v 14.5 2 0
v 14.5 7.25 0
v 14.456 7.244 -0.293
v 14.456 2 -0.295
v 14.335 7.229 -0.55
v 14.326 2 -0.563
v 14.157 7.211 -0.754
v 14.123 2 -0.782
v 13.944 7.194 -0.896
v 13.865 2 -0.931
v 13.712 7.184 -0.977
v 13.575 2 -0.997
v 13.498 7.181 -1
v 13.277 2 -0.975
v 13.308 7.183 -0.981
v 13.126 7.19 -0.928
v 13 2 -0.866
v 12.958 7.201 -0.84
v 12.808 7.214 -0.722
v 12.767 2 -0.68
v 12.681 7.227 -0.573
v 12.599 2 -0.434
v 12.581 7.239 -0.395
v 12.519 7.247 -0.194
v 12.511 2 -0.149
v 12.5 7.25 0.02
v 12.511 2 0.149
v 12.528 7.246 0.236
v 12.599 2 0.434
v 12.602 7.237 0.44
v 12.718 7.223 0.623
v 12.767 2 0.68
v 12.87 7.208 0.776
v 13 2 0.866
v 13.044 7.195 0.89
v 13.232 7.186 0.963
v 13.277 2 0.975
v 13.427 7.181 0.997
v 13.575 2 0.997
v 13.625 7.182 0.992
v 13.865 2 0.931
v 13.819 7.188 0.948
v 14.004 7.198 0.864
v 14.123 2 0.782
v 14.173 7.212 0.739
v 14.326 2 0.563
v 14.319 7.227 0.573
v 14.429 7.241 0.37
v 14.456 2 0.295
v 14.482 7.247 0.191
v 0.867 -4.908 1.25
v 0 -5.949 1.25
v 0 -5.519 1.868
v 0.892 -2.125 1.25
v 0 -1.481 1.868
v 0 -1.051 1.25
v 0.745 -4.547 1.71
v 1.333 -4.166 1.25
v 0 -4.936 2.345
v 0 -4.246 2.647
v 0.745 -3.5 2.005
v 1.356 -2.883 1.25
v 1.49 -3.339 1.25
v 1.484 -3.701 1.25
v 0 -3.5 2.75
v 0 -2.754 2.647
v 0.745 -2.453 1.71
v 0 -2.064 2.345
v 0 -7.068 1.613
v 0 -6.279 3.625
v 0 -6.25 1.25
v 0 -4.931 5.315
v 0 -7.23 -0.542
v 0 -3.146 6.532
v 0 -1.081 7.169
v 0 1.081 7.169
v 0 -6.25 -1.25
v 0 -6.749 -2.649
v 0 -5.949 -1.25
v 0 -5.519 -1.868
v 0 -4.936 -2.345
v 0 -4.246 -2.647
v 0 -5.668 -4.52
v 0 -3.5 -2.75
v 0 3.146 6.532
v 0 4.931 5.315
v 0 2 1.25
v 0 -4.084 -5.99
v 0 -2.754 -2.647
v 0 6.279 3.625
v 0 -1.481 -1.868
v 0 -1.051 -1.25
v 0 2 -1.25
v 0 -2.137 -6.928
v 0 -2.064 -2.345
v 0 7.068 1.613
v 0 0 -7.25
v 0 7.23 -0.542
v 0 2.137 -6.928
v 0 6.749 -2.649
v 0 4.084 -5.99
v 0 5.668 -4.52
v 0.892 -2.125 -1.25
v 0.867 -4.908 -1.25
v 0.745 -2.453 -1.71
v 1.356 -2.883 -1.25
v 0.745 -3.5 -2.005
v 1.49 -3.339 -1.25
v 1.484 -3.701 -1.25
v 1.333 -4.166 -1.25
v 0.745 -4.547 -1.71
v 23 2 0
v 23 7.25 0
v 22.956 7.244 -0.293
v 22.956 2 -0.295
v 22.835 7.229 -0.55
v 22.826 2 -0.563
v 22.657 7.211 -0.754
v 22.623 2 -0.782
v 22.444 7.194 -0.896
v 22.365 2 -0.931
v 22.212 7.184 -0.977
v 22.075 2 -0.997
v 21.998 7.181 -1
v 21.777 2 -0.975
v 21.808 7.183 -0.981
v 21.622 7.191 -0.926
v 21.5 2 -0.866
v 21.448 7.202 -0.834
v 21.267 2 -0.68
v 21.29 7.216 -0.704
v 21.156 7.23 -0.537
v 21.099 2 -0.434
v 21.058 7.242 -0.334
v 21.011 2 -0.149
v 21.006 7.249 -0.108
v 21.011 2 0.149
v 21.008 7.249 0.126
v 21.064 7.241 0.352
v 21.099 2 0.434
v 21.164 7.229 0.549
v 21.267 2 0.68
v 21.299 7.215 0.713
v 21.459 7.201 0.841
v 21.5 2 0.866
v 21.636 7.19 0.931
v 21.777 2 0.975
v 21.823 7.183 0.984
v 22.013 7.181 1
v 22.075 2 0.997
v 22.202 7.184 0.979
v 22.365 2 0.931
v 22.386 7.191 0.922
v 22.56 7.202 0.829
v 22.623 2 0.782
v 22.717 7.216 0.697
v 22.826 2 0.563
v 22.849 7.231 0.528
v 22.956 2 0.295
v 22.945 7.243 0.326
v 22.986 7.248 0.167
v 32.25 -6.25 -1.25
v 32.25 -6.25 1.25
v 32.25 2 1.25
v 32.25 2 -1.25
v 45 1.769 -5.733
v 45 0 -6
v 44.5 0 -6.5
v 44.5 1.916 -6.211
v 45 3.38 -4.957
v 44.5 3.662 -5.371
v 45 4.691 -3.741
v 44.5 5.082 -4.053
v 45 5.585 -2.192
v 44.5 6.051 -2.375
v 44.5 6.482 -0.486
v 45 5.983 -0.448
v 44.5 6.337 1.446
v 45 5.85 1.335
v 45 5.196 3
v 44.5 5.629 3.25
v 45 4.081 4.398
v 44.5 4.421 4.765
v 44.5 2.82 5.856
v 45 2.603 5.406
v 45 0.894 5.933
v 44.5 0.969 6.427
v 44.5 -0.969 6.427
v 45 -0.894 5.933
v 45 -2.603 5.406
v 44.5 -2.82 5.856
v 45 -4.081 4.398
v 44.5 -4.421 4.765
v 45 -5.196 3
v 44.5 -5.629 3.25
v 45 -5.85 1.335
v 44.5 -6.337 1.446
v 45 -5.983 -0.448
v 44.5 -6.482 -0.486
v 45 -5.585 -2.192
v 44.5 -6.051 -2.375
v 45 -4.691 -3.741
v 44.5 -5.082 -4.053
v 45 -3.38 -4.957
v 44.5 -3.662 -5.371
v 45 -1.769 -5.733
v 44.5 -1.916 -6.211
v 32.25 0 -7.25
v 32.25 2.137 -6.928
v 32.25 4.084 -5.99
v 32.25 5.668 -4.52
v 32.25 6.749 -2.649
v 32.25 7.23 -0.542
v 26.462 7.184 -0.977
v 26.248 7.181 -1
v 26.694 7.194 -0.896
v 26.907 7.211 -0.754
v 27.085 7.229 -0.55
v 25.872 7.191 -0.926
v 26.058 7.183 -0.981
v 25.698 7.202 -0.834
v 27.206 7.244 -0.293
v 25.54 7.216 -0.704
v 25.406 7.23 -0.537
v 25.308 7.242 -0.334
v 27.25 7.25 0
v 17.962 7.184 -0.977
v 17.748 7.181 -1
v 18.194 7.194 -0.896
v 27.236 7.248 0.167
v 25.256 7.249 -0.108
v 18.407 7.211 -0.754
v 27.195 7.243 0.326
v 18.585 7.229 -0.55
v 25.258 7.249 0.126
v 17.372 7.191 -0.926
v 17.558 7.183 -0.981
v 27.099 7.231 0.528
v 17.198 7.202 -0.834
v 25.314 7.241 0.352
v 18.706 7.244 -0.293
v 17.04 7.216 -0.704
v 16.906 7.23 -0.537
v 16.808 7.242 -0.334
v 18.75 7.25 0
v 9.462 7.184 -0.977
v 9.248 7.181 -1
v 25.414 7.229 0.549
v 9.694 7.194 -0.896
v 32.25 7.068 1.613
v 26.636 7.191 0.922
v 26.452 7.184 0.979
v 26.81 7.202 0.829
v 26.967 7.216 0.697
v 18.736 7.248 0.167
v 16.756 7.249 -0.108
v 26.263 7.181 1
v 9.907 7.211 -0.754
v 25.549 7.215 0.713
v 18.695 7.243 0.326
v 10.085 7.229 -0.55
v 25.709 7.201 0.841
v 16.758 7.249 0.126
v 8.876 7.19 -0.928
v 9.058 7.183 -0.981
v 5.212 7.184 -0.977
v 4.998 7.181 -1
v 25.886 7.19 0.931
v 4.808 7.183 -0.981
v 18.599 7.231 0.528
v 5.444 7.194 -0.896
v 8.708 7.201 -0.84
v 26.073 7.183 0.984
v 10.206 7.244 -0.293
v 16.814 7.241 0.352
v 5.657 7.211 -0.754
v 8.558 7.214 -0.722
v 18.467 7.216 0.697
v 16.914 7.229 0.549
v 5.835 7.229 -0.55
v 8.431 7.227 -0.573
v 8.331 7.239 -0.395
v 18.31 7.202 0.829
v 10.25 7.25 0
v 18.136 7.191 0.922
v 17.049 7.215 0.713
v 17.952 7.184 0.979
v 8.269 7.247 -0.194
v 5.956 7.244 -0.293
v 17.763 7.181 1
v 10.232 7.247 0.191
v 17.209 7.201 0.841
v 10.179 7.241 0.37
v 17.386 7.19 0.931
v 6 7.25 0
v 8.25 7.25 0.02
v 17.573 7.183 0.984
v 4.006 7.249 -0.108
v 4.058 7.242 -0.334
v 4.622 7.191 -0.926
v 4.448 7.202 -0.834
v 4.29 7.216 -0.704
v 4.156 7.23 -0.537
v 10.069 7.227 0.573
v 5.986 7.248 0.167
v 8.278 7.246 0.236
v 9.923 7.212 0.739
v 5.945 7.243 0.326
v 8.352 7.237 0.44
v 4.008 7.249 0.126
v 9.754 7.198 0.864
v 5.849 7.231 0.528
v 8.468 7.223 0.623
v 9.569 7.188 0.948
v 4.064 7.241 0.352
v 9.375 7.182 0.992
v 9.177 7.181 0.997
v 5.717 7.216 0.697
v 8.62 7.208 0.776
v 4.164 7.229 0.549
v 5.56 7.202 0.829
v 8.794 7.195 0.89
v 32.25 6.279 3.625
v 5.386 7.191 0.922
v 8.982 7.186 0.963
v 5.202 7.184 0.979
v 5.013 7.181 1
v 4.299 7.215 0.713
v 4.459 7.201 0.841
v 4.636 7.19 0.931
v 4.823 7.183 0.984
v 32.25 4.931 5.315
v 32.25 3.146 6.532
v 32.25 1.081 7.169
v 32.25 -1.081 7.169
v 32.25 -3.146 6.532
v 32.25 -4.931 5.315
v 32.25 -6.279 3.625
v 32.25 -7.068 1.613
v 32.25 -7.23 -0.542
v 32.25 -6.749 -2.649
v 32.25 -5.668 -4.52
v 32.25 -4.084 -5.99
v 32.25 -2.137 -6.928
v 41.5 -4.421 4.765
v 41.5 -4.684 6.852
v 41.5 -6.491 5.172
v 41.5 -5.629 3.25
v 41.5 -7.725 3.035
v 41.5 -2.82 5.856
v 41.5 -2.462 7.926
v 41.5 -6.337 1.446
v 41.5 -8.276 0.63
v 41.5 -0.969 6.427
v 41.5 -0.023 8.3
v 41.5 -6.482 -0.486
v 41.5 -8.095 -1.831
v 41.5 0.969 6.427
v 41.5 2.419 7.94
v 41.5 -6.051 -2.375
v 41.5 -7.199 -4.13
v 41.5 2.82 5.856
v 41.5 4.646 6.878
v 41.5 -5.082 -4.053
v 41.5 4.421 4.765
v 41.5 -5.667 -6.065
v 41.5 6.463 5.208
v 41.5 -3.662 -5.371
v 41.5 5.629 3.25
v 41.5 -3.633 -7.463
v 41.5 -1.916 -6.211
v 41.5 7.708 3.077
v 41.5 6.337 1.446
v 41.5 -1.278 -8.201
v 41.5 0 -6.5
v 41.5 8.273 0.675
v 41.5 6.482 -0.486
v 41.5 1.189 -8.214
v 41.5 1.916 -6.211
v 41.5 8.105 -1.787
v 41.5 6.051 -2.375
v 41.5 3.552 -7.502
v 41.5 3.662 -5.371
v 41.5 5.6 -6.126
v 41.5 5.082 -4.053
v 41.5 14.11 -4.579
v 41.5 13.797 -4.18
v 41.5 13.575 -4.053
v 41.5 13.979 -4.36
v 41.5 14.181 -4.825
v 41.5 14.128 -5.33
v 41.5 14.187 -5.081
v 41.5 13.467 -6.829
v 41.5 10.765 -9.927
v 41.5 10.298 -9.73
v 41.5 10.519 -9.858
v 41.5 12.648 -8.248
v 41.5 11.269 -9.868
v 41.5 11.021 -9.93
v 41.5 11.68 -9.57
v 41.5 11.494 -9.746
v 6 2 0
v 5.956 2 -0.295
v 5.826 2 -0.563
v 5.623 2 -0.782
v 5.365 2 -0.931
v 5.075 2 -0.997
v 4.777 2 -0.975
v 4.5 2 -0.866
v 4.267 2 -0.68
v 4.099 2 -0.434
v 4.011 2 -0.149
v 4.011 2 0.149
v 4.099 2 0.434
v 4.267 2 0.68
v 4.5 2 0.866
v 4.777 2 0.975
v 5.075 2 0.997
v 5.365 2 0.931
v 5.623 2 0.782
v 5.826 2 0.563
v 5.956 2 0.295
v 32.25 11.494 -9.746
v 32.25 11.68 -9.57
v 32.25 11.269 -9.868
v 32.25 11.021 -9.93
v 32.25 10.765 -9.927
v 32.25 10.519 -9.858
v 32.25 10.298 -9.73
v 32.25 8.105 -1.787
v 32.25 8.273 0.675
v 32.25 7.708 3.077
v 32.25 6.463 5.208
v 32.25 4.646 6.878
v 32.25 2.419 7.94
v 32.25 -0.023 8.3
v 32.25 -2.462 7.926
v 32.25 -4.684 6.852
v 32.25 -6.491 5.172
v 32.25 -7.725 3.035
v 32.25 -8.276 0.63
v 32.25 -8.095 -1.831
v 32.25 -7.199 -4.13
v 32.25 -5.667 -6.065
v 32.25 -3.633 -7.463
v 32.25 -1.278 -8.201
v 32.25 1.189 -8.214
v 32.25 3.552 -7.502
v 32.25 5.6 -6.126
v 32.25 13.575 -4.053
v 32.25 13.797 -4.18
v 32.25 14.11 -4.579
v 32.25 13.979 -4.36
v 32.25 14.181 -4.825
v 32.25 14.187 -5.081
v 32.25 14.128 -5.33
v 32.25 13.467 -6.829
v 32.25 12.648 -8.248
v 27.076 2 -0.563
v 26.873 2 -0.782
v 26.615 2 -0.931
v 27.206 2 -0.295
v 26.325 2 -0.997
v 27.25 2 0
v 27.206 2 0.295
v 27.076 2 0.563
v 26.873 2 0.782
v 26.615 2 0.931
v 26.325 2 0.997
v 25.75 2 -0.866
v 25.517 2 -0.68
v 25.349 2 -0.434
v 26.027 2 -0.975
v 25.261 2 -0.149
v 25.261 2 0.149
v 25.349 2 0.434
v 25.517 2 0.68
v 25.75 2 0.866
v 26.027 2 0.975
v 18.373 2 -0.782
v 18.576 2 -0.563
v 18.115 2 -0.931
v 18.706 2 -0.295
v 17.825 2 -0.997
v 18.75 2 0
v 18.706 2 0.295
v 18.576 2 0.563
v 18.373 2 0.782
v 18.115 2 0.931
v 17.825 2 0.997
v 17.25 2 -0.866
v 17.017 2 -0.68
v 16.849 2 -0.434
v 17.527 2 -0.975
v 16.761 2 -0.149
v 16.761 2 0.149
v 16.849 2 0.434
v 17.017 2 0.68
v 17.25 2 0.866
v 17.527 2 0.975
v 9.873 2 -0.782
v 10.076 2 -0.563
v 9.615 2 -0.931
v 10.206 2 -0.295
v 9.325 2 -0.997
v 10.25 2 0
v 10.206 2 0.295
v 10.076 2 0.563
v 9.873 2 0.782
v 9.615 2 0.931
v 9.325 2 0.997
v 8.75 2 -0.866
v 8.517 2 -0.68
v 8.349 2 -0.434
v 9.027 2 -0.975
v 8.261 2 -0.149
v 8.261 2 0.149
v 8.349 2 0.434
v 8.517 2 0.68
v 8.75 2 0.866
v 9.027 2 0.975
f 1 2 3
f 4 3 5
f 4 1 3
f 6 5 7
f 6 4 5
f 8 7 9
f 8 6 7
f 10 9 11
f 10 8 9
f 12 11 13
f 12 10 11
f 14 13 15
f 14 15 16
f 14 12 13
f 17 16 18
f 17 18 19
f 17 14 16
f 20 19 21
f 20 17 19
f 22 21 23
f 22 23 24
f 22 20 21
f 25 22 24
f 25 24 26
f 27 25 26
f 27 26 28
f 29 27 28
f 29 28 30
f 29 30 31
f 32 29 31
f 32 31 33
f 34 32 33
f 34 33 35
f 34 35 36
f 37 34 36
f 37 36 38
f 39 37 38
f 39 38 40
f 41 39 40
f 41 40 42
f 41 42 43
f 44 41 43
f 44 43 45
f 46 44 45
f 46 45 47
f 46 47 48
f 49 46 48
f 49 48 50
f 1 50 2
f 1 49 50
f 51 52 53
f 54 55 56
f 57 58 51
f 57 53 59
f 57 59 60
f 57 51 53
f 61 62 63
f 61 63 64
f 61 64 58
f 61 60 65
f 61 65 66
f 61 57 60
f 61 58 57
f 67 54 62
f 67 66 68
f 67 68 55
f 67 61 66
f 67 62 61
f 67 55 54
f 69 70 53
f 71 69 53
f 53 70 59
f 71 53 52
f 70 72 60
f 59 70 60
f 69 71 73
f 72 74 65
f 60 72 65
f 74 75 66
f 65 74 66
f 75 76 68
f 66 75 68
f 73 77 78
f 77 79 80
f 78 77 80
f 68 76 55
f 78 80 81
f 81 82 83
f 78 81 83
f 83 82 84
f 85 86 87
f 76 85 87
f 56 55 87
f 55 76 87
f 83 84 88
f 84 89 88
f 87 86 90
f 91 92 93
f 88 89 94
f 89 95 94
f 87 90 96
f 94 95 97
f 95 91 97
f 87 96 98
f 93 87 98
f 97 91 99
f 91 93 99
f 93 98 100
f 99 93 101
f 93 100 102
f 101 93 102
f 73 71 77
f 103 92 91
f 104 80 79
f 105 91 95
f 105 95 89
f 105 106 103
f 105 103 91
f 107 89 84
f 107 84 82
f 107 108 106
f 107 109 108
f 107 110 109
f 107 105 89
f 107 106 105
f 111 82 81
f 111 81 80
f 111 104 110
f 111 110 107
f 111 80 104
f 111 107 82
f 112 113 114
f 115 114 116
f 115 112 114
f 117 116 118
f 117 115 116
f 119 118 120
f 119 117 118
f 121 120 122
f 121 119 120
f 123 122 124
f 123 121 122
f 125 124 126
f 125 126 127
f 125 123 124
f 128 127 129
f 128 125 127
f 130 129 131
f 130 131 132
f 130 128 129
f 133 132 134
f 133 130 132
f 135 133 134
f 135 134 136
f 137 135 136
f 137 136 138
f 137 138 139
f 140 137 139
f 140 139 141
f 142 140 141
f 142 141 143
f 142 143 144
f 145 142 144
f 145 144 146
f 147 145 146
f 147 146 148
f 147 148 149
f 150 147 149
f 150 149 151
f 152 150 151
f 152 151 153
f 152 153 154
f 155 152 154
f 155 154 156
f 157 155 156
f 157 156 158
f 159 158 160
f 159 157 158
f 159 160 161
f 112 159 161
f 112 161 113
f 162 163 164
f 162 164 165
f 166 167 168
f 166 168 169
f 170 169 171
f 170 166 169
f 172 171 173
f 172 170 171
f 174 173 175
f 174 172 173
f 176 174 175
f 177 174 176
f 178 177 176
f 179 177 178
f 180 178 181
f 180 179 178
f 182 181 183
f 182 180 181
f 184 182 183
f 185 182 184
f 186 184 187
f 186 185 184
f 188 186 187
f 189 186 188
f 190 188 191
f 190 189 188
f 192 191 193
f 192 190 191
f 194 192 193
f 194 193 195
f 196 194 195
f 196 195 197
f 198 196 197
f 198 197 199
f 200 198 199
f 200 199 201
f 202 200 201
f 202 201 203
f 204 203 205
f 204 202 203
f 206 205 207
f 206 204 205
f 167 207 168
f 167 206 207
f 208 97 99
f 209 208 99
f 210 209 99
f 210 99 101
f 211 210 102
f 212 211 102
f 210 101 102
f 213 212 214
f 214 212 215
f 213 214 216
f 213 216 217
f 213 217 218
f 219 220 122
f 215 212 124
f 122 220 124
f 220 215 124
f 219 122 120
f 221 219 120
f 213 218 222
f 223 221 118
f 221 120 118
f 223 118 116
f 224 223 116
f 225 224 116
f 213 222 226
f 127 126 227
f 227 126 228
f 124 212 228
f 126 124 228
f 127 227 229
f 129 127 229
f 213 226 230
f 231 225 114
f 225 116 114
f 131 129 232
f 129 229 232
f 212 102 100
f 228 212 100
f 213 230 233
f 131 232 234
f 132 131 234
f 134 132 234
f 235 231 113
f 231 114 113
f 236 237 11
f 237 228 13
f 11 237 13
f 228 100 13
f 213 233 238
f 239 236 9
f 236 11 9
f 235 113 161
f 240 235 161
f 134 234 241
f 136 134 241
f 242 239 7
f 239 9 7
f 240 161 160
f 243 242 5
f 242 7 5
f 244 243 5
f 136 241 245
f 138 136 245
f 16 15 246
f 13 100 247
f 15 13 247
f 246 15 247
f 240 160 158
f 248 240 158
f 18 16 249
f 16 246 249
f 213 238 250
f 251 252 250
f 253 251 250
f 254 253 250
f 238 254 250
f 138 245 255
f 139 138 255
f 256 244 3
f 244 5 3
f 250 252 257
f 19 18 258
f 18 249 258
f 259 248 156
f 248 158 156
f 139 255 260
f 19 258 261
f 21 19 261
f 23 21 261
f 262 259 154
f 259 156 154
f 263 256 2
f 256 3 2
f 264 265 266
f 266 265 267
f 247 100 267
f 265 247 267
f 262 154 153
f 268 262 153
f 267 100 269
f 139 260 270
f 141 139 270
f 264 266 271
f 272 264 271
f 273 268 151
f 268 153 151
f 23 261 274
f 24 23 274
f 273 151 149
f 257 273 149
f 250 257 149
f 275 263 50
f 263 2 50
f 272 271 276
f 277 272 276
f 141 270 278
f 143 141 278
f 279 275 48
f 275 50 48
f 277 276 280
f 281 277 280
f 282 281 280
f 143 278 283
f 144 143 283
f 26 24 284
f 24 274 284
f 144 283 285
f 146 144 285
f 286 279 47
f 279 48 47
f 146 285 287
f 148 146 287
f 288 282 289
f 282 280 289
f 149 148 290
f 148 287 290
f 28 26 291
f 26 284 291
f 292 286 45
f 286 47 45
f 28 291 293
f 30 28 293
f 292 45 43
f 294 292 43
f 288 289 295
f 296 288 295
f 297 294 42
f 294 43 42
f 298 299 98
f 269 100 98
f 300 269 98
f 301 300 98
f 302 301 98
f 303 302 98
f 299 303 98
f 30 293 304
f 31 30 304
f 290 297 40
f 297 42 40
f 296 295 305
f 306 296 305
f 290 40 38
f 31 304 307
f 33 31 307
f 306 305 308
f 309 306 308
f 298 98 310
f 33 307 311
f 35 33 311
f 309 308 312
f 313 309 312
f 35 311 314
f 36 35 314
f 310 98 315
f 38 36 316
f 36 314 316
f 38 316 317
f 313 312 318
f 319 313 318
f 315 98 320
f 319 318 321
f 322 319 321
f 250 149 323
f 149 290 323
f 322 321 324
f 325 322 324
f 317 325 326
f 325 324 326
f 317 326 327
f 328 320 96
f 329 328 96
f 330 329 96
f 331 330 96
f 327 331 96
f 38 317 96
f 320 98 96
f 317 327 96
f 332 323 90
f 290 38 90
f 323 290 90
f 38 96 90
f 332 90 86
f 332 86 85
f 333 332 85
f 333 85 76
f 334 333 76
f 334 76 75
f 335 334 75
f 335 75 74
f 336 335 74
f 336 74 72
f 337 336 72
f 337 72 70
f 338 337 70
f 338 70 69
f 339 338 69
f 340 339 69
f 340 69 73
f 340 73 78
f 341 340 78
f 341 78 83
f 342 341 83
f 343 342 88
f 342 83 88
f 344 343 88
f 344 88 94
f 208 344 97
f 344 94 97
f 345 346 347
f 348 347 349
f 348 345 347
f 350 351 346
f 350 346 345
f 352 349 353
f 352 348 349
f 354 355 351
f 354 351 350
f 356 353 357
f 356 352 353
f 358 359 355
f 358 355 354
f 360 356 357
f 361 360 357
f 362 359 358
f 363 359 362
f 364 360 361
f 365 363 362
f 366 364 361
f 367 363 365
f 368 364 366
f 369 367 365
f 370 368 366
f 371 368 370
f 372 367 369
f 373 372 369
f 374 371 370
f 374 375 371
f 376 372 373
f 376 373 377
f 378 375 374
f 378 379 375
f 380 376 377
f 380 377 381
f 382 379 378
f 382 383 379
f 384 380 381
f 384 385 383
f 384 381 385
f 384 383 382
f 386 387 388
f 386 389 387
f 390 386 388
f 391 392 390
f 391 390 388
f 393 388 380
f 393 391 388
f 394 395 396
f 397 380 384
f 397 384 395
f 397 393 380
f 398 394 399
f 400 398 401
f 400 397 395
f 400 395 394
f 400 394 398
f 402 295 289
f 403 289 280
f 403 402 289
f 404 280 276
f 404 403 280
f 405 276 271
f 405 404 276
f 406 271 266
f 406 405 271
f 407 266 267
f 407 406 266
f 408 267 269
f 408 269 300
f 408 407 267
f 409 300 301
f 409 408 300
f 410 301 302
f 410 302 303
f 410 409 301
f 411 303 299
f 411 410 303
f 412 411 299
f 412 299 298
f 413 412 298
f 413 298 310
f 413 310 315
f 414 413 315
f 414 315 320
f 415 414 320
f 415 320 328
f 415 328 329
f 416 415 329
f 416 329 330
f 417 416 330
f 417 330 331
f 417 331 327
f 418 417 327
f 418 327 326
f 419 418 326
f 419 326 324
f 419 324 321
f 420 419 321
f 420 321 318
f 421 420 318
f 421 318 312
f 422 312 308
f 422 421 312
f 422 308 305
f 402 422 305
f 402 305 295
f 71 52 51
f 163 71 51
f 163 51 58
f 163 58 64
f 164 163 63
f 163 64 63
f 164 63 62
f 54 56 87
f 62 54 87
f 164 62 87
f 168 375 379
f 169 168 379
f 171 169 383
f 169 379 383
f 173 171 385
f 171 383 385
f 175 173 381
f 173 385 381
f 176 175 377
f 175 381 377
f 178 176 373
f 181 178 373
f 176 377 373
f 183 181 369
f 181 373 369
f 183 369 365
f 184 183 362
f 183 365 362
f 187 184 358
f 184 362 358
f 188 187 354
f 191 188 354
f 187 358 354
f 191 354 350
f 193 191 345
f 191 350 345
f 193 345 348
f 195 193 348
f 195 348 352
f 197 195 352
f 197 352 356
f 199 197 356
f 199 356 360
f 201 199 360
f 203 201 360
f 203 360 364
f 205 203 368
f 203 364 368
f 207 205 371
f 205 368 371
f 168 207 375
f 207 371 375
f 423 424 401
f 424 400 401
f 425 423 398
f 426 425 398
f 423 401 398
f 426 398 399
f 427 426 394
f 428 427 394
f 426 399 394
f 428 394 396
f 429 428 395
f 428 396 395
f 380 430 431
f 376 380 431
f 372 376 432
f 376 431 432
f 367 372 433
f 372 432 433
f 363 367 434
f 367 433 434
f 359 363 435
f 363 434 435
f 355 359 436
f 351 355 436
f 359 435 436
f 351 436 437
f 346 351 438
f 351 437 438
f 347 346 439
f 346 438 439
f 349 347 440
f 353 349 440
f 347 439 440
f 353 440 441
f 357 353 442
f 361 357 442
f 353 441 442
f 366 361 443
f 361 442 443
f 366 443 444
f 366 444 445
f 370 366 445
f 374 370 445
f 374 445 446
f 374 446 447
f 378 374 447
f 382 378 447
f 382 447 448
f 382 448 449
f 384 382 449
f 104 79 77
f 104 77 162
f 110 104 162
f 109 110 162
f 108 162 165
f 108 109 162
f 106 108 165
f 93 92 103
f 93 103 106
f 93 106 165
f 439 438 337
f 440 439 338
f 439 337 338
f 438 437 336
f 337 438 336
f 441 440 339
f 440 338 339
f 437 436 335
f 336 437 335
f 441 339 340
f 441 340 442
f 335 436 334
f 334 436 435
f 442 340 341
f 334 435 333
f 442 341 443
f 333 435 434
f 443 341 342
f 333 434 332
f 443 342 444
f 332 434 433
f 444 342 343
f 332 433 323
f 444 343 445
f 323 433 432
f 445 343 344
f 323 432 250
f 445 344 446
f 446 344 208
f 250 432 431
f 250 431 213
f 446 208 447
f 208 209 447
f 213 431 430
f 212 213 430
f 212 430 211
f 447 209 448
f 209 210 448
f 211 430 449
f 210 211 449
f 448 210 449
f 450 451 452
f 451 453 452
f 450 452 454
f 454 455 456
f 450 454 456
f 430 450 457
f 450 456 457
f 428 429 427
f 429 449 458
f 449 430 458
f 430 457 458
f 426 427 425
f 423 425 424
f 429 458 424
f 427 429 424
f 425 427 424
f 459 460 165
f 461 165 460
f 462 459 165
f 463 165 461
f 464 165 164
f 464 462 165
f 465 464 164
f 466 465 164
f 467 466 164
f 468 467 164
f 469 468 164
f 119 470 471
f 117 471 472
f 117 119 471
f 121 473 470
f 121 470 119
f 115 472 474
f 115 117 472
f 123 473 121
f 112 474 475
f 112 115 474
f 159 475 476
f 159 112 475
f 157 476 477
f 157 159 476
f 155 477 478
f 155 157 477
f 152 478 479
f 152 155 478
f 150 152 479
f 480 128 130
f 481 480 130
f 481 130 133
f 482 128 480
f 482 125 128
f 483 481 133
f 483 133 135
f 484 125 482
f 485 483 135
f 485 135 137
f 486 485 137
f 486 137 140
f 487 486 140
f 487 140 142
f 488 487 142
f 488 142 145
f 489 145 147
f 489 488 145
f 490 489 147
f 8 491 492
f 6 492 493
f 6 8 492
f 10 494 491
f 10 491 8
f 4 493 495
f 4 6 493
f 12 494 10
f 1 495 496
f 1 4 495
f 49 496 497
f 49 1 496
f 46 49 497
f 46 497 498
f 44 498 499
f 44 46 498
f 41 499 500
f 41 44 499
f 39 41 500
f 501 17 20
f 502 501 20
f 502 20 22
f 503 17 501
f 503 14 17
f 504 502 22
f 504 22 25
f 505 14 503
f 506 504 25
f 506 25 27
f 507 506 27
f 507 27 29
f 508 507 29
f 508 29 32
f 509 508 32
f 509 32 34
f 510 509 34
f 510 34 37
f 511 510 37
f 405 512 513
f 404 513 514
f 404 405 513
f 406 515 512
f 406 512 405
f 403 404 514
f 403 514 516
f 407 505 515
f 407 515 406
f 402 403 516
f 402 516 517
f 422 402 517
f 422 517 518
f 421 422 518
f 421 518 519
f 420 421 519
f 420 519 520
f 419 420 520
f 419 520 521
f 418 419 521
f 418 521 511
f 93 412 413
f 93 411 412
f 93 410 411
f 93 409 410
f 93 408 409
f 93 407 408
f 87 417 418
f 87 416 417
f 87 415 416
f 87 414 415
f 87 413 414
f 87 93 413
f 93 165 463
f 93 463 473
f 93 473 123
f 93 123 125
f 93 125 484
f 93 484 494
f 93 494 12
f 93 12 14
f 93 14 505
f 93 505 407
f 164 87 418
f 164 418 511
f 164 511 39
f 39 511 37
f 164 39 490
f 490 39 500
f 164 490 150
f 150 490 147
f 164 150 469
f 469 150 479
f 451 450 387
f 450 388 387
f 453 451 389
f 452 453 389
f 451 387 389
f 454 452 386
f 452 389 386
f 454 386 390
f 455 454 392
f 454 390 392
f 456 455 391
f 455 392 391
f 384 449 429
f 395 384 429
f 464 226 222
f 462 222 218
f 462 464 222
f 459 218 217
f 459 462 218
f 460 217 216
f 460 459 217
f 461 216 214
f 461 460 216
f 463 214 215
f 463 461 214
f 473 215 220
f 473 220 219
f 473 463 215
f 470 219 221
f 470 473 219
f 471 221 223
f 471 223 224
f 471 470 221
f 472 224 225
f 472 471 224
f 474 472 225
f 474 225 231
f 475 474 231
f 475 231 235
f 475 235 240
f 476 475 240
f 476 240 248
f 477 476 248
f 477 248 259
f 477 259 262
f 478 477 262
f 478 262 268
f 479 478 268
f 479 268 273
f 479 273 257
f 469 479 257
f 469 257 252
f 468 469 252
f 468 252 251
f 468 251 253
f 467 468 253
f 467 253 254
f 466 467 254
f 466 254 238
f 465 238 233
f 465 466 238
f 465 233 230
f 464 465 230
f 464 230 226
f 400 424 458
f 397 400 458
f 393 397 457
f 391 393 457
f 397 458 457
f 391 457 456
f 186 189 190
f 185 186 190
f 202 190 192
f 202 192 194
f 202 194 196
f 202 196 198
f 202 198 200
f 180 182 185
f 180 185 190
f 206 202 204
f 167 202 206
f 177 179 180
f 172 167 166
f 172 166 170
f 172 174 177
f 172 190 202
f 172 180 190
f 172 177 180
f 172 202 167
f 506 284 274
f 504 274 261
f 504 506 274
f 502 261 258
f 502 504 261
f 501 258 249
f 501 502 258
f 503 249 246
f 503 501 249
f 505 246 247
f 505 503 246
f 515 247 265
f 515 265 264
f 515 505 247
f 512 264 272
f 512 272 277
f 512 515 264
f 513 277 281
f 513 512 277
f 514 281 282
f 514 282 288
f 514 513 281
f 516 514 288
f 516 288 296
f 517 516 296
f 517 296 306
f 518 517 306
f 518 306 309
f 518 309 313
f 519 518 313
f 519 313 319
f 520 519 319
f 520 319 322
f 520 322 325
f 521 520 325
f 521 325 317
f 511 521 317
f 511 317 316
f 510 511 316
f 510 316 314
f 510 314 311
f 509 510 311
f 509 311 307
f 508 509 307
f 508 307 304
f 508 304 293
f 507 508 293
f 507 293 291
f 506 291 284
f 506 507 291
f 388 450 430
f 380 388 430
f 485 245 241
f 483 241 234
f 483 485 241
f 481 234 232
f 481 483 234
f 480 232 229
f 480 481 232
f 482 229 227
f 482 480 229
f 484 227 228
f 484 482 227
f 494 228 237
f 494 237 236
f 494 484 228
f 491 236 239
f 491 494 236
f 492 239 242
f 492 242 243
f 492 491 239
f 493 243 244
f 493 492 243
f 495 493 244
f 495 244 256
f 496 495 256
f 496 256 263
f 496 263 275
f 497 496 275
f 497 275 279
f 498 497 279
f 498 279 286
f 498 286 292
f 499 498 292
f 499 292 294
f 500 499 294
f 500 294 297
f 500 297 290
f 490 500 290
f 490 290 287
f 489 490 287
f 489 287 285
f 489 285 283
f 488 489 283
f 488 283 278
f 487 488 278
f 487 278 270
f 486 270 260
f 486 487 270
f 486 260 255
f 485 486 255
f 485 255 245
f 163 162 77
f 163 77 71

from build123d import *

# Parameters (mm, degrees)
SKETCH1_R           = 7.25
OUTSIDE_DIA_DEPTH   = 32.25
SKETCH2_W           = 2.5
SKETCH2_H           = 8.25
KEYHOLE_DEPTH       = 33.25
SKETCH3_R           = 1
PIN_1_DEPTH         = 35
LPATTERN1_COUNT     = 6
LPATTERN1_PITCH     = 4.25
CAM_DEPTH           = 9.25
FILLET_R1_R         = 1
SKETCH6_R           = 6.5
END_BIT_DEPTH       = 3.5
F_0_5_X_45_DEG_SIZE = 0.5


with BuildPart() as part:
    # Sketch1 → outside dia (new body)
    with BuildSketch(Plane(origin=(0, 0, 0), x_dir=(0, 0, -1), z_dir=(1, 0, 0))):
        Circle(SKETCH1_R)
    extrude(amount=OUTSIDE_DIA_DEPTH)

    # Sketch2 → keyhole (cut, through all)
    with BuildSketch(Plane.ZY):
        with Locations((0, -2.125)):
            Rectangle(SKETCH2_W, SKETCH2_H)
    extrude(amount=-KEYHOLE_DEPTH, mode=Mode.SUBTRACT)

    # Sketch3 → pin 1 (cut)
    with BuildSketch(Plane(origin=(0, 0, 0), x_dir=(1, 0, 0), z_dir=(0, 1, 0))):
        with Locations((5, 0)):
            Circle(SKETCH3_R)
    pin_1 = extrude(amount=PIN_1_DEPTH, mode=Mode.SUBTRACT)

    # LPattern1: pin 1 ×6
    with Locations(*[(i * LPATTERN1_PITCH, 0, 0) for i in range(1, LPATTERN1_COUNT)]):
        add(pin_1, mode=Mode.SUBTRACT)

    # Sketch4 → front cone 5.5 x 90 deg (revolve, cut)
    with BuildSketch(Plane.XY):
        Polygon((0, -3.5), (0, -6.25), (2.75, -3.5), align=None)
    revolve(axis=Axis((2.75, -3.5, 0), (-1, 0, 0)), mode=Mode.SUBTRACT)

    # Sketch5 → cam (add)
    with BuildSketch(Plane(origin=(32.25, 0, 0), x_dir=(0, 0, -1), z_dir=(1, 0, 0))):
        with BuildLine():
            Line((4.411633528, 14.441173415), (1.787227075, 8.105295762))
            ThreePointArc((1.787227075, 8.105295762), (-4.15, -7.188010851), (6.125778497, 5.60043193))
            Line((6.125778497, 5.60043193), (10.300606274, 11.041173415))
            ThreePointArc((10.300606274, 11.041173415), (7.55, 13.076983597), (4.411633528, 14.441173415))
        make_face()
    extrude(amount=CAM_DEPTH)

    # Fillet R1
    fillet_r1_edges = [part.edges().sort_by_distance(p)[0] for p in [
        (36.875, 11.041173415, -10.300606274),
        (36.875, 14.441173415, -4.411633528),
    ]]
    fillet(fillet_r1_edges, radius=FILLET_R1_R)

    # Sketch6 → end bit (add)
    with BuildSketch(Plane(origin=(41.5, 0, 0), x_dir=(0, 0, -1), z_dir=(1, 0, 0))):
        Circle(SKETCH6_R)
    extrude(amount=END_BIT_DEPTH)

    # 0.5 x 45 deg
    f_0_5_x_45_deg_edges = [part.edges().sort_by_distance(p)[0] for p in [
        (45, 0, 6.5),
    ]]
    chamfer(f_0_5_x_45_deg_edges, length=F_0_5_X_45_DEG_SIZE)


solid = part.part
